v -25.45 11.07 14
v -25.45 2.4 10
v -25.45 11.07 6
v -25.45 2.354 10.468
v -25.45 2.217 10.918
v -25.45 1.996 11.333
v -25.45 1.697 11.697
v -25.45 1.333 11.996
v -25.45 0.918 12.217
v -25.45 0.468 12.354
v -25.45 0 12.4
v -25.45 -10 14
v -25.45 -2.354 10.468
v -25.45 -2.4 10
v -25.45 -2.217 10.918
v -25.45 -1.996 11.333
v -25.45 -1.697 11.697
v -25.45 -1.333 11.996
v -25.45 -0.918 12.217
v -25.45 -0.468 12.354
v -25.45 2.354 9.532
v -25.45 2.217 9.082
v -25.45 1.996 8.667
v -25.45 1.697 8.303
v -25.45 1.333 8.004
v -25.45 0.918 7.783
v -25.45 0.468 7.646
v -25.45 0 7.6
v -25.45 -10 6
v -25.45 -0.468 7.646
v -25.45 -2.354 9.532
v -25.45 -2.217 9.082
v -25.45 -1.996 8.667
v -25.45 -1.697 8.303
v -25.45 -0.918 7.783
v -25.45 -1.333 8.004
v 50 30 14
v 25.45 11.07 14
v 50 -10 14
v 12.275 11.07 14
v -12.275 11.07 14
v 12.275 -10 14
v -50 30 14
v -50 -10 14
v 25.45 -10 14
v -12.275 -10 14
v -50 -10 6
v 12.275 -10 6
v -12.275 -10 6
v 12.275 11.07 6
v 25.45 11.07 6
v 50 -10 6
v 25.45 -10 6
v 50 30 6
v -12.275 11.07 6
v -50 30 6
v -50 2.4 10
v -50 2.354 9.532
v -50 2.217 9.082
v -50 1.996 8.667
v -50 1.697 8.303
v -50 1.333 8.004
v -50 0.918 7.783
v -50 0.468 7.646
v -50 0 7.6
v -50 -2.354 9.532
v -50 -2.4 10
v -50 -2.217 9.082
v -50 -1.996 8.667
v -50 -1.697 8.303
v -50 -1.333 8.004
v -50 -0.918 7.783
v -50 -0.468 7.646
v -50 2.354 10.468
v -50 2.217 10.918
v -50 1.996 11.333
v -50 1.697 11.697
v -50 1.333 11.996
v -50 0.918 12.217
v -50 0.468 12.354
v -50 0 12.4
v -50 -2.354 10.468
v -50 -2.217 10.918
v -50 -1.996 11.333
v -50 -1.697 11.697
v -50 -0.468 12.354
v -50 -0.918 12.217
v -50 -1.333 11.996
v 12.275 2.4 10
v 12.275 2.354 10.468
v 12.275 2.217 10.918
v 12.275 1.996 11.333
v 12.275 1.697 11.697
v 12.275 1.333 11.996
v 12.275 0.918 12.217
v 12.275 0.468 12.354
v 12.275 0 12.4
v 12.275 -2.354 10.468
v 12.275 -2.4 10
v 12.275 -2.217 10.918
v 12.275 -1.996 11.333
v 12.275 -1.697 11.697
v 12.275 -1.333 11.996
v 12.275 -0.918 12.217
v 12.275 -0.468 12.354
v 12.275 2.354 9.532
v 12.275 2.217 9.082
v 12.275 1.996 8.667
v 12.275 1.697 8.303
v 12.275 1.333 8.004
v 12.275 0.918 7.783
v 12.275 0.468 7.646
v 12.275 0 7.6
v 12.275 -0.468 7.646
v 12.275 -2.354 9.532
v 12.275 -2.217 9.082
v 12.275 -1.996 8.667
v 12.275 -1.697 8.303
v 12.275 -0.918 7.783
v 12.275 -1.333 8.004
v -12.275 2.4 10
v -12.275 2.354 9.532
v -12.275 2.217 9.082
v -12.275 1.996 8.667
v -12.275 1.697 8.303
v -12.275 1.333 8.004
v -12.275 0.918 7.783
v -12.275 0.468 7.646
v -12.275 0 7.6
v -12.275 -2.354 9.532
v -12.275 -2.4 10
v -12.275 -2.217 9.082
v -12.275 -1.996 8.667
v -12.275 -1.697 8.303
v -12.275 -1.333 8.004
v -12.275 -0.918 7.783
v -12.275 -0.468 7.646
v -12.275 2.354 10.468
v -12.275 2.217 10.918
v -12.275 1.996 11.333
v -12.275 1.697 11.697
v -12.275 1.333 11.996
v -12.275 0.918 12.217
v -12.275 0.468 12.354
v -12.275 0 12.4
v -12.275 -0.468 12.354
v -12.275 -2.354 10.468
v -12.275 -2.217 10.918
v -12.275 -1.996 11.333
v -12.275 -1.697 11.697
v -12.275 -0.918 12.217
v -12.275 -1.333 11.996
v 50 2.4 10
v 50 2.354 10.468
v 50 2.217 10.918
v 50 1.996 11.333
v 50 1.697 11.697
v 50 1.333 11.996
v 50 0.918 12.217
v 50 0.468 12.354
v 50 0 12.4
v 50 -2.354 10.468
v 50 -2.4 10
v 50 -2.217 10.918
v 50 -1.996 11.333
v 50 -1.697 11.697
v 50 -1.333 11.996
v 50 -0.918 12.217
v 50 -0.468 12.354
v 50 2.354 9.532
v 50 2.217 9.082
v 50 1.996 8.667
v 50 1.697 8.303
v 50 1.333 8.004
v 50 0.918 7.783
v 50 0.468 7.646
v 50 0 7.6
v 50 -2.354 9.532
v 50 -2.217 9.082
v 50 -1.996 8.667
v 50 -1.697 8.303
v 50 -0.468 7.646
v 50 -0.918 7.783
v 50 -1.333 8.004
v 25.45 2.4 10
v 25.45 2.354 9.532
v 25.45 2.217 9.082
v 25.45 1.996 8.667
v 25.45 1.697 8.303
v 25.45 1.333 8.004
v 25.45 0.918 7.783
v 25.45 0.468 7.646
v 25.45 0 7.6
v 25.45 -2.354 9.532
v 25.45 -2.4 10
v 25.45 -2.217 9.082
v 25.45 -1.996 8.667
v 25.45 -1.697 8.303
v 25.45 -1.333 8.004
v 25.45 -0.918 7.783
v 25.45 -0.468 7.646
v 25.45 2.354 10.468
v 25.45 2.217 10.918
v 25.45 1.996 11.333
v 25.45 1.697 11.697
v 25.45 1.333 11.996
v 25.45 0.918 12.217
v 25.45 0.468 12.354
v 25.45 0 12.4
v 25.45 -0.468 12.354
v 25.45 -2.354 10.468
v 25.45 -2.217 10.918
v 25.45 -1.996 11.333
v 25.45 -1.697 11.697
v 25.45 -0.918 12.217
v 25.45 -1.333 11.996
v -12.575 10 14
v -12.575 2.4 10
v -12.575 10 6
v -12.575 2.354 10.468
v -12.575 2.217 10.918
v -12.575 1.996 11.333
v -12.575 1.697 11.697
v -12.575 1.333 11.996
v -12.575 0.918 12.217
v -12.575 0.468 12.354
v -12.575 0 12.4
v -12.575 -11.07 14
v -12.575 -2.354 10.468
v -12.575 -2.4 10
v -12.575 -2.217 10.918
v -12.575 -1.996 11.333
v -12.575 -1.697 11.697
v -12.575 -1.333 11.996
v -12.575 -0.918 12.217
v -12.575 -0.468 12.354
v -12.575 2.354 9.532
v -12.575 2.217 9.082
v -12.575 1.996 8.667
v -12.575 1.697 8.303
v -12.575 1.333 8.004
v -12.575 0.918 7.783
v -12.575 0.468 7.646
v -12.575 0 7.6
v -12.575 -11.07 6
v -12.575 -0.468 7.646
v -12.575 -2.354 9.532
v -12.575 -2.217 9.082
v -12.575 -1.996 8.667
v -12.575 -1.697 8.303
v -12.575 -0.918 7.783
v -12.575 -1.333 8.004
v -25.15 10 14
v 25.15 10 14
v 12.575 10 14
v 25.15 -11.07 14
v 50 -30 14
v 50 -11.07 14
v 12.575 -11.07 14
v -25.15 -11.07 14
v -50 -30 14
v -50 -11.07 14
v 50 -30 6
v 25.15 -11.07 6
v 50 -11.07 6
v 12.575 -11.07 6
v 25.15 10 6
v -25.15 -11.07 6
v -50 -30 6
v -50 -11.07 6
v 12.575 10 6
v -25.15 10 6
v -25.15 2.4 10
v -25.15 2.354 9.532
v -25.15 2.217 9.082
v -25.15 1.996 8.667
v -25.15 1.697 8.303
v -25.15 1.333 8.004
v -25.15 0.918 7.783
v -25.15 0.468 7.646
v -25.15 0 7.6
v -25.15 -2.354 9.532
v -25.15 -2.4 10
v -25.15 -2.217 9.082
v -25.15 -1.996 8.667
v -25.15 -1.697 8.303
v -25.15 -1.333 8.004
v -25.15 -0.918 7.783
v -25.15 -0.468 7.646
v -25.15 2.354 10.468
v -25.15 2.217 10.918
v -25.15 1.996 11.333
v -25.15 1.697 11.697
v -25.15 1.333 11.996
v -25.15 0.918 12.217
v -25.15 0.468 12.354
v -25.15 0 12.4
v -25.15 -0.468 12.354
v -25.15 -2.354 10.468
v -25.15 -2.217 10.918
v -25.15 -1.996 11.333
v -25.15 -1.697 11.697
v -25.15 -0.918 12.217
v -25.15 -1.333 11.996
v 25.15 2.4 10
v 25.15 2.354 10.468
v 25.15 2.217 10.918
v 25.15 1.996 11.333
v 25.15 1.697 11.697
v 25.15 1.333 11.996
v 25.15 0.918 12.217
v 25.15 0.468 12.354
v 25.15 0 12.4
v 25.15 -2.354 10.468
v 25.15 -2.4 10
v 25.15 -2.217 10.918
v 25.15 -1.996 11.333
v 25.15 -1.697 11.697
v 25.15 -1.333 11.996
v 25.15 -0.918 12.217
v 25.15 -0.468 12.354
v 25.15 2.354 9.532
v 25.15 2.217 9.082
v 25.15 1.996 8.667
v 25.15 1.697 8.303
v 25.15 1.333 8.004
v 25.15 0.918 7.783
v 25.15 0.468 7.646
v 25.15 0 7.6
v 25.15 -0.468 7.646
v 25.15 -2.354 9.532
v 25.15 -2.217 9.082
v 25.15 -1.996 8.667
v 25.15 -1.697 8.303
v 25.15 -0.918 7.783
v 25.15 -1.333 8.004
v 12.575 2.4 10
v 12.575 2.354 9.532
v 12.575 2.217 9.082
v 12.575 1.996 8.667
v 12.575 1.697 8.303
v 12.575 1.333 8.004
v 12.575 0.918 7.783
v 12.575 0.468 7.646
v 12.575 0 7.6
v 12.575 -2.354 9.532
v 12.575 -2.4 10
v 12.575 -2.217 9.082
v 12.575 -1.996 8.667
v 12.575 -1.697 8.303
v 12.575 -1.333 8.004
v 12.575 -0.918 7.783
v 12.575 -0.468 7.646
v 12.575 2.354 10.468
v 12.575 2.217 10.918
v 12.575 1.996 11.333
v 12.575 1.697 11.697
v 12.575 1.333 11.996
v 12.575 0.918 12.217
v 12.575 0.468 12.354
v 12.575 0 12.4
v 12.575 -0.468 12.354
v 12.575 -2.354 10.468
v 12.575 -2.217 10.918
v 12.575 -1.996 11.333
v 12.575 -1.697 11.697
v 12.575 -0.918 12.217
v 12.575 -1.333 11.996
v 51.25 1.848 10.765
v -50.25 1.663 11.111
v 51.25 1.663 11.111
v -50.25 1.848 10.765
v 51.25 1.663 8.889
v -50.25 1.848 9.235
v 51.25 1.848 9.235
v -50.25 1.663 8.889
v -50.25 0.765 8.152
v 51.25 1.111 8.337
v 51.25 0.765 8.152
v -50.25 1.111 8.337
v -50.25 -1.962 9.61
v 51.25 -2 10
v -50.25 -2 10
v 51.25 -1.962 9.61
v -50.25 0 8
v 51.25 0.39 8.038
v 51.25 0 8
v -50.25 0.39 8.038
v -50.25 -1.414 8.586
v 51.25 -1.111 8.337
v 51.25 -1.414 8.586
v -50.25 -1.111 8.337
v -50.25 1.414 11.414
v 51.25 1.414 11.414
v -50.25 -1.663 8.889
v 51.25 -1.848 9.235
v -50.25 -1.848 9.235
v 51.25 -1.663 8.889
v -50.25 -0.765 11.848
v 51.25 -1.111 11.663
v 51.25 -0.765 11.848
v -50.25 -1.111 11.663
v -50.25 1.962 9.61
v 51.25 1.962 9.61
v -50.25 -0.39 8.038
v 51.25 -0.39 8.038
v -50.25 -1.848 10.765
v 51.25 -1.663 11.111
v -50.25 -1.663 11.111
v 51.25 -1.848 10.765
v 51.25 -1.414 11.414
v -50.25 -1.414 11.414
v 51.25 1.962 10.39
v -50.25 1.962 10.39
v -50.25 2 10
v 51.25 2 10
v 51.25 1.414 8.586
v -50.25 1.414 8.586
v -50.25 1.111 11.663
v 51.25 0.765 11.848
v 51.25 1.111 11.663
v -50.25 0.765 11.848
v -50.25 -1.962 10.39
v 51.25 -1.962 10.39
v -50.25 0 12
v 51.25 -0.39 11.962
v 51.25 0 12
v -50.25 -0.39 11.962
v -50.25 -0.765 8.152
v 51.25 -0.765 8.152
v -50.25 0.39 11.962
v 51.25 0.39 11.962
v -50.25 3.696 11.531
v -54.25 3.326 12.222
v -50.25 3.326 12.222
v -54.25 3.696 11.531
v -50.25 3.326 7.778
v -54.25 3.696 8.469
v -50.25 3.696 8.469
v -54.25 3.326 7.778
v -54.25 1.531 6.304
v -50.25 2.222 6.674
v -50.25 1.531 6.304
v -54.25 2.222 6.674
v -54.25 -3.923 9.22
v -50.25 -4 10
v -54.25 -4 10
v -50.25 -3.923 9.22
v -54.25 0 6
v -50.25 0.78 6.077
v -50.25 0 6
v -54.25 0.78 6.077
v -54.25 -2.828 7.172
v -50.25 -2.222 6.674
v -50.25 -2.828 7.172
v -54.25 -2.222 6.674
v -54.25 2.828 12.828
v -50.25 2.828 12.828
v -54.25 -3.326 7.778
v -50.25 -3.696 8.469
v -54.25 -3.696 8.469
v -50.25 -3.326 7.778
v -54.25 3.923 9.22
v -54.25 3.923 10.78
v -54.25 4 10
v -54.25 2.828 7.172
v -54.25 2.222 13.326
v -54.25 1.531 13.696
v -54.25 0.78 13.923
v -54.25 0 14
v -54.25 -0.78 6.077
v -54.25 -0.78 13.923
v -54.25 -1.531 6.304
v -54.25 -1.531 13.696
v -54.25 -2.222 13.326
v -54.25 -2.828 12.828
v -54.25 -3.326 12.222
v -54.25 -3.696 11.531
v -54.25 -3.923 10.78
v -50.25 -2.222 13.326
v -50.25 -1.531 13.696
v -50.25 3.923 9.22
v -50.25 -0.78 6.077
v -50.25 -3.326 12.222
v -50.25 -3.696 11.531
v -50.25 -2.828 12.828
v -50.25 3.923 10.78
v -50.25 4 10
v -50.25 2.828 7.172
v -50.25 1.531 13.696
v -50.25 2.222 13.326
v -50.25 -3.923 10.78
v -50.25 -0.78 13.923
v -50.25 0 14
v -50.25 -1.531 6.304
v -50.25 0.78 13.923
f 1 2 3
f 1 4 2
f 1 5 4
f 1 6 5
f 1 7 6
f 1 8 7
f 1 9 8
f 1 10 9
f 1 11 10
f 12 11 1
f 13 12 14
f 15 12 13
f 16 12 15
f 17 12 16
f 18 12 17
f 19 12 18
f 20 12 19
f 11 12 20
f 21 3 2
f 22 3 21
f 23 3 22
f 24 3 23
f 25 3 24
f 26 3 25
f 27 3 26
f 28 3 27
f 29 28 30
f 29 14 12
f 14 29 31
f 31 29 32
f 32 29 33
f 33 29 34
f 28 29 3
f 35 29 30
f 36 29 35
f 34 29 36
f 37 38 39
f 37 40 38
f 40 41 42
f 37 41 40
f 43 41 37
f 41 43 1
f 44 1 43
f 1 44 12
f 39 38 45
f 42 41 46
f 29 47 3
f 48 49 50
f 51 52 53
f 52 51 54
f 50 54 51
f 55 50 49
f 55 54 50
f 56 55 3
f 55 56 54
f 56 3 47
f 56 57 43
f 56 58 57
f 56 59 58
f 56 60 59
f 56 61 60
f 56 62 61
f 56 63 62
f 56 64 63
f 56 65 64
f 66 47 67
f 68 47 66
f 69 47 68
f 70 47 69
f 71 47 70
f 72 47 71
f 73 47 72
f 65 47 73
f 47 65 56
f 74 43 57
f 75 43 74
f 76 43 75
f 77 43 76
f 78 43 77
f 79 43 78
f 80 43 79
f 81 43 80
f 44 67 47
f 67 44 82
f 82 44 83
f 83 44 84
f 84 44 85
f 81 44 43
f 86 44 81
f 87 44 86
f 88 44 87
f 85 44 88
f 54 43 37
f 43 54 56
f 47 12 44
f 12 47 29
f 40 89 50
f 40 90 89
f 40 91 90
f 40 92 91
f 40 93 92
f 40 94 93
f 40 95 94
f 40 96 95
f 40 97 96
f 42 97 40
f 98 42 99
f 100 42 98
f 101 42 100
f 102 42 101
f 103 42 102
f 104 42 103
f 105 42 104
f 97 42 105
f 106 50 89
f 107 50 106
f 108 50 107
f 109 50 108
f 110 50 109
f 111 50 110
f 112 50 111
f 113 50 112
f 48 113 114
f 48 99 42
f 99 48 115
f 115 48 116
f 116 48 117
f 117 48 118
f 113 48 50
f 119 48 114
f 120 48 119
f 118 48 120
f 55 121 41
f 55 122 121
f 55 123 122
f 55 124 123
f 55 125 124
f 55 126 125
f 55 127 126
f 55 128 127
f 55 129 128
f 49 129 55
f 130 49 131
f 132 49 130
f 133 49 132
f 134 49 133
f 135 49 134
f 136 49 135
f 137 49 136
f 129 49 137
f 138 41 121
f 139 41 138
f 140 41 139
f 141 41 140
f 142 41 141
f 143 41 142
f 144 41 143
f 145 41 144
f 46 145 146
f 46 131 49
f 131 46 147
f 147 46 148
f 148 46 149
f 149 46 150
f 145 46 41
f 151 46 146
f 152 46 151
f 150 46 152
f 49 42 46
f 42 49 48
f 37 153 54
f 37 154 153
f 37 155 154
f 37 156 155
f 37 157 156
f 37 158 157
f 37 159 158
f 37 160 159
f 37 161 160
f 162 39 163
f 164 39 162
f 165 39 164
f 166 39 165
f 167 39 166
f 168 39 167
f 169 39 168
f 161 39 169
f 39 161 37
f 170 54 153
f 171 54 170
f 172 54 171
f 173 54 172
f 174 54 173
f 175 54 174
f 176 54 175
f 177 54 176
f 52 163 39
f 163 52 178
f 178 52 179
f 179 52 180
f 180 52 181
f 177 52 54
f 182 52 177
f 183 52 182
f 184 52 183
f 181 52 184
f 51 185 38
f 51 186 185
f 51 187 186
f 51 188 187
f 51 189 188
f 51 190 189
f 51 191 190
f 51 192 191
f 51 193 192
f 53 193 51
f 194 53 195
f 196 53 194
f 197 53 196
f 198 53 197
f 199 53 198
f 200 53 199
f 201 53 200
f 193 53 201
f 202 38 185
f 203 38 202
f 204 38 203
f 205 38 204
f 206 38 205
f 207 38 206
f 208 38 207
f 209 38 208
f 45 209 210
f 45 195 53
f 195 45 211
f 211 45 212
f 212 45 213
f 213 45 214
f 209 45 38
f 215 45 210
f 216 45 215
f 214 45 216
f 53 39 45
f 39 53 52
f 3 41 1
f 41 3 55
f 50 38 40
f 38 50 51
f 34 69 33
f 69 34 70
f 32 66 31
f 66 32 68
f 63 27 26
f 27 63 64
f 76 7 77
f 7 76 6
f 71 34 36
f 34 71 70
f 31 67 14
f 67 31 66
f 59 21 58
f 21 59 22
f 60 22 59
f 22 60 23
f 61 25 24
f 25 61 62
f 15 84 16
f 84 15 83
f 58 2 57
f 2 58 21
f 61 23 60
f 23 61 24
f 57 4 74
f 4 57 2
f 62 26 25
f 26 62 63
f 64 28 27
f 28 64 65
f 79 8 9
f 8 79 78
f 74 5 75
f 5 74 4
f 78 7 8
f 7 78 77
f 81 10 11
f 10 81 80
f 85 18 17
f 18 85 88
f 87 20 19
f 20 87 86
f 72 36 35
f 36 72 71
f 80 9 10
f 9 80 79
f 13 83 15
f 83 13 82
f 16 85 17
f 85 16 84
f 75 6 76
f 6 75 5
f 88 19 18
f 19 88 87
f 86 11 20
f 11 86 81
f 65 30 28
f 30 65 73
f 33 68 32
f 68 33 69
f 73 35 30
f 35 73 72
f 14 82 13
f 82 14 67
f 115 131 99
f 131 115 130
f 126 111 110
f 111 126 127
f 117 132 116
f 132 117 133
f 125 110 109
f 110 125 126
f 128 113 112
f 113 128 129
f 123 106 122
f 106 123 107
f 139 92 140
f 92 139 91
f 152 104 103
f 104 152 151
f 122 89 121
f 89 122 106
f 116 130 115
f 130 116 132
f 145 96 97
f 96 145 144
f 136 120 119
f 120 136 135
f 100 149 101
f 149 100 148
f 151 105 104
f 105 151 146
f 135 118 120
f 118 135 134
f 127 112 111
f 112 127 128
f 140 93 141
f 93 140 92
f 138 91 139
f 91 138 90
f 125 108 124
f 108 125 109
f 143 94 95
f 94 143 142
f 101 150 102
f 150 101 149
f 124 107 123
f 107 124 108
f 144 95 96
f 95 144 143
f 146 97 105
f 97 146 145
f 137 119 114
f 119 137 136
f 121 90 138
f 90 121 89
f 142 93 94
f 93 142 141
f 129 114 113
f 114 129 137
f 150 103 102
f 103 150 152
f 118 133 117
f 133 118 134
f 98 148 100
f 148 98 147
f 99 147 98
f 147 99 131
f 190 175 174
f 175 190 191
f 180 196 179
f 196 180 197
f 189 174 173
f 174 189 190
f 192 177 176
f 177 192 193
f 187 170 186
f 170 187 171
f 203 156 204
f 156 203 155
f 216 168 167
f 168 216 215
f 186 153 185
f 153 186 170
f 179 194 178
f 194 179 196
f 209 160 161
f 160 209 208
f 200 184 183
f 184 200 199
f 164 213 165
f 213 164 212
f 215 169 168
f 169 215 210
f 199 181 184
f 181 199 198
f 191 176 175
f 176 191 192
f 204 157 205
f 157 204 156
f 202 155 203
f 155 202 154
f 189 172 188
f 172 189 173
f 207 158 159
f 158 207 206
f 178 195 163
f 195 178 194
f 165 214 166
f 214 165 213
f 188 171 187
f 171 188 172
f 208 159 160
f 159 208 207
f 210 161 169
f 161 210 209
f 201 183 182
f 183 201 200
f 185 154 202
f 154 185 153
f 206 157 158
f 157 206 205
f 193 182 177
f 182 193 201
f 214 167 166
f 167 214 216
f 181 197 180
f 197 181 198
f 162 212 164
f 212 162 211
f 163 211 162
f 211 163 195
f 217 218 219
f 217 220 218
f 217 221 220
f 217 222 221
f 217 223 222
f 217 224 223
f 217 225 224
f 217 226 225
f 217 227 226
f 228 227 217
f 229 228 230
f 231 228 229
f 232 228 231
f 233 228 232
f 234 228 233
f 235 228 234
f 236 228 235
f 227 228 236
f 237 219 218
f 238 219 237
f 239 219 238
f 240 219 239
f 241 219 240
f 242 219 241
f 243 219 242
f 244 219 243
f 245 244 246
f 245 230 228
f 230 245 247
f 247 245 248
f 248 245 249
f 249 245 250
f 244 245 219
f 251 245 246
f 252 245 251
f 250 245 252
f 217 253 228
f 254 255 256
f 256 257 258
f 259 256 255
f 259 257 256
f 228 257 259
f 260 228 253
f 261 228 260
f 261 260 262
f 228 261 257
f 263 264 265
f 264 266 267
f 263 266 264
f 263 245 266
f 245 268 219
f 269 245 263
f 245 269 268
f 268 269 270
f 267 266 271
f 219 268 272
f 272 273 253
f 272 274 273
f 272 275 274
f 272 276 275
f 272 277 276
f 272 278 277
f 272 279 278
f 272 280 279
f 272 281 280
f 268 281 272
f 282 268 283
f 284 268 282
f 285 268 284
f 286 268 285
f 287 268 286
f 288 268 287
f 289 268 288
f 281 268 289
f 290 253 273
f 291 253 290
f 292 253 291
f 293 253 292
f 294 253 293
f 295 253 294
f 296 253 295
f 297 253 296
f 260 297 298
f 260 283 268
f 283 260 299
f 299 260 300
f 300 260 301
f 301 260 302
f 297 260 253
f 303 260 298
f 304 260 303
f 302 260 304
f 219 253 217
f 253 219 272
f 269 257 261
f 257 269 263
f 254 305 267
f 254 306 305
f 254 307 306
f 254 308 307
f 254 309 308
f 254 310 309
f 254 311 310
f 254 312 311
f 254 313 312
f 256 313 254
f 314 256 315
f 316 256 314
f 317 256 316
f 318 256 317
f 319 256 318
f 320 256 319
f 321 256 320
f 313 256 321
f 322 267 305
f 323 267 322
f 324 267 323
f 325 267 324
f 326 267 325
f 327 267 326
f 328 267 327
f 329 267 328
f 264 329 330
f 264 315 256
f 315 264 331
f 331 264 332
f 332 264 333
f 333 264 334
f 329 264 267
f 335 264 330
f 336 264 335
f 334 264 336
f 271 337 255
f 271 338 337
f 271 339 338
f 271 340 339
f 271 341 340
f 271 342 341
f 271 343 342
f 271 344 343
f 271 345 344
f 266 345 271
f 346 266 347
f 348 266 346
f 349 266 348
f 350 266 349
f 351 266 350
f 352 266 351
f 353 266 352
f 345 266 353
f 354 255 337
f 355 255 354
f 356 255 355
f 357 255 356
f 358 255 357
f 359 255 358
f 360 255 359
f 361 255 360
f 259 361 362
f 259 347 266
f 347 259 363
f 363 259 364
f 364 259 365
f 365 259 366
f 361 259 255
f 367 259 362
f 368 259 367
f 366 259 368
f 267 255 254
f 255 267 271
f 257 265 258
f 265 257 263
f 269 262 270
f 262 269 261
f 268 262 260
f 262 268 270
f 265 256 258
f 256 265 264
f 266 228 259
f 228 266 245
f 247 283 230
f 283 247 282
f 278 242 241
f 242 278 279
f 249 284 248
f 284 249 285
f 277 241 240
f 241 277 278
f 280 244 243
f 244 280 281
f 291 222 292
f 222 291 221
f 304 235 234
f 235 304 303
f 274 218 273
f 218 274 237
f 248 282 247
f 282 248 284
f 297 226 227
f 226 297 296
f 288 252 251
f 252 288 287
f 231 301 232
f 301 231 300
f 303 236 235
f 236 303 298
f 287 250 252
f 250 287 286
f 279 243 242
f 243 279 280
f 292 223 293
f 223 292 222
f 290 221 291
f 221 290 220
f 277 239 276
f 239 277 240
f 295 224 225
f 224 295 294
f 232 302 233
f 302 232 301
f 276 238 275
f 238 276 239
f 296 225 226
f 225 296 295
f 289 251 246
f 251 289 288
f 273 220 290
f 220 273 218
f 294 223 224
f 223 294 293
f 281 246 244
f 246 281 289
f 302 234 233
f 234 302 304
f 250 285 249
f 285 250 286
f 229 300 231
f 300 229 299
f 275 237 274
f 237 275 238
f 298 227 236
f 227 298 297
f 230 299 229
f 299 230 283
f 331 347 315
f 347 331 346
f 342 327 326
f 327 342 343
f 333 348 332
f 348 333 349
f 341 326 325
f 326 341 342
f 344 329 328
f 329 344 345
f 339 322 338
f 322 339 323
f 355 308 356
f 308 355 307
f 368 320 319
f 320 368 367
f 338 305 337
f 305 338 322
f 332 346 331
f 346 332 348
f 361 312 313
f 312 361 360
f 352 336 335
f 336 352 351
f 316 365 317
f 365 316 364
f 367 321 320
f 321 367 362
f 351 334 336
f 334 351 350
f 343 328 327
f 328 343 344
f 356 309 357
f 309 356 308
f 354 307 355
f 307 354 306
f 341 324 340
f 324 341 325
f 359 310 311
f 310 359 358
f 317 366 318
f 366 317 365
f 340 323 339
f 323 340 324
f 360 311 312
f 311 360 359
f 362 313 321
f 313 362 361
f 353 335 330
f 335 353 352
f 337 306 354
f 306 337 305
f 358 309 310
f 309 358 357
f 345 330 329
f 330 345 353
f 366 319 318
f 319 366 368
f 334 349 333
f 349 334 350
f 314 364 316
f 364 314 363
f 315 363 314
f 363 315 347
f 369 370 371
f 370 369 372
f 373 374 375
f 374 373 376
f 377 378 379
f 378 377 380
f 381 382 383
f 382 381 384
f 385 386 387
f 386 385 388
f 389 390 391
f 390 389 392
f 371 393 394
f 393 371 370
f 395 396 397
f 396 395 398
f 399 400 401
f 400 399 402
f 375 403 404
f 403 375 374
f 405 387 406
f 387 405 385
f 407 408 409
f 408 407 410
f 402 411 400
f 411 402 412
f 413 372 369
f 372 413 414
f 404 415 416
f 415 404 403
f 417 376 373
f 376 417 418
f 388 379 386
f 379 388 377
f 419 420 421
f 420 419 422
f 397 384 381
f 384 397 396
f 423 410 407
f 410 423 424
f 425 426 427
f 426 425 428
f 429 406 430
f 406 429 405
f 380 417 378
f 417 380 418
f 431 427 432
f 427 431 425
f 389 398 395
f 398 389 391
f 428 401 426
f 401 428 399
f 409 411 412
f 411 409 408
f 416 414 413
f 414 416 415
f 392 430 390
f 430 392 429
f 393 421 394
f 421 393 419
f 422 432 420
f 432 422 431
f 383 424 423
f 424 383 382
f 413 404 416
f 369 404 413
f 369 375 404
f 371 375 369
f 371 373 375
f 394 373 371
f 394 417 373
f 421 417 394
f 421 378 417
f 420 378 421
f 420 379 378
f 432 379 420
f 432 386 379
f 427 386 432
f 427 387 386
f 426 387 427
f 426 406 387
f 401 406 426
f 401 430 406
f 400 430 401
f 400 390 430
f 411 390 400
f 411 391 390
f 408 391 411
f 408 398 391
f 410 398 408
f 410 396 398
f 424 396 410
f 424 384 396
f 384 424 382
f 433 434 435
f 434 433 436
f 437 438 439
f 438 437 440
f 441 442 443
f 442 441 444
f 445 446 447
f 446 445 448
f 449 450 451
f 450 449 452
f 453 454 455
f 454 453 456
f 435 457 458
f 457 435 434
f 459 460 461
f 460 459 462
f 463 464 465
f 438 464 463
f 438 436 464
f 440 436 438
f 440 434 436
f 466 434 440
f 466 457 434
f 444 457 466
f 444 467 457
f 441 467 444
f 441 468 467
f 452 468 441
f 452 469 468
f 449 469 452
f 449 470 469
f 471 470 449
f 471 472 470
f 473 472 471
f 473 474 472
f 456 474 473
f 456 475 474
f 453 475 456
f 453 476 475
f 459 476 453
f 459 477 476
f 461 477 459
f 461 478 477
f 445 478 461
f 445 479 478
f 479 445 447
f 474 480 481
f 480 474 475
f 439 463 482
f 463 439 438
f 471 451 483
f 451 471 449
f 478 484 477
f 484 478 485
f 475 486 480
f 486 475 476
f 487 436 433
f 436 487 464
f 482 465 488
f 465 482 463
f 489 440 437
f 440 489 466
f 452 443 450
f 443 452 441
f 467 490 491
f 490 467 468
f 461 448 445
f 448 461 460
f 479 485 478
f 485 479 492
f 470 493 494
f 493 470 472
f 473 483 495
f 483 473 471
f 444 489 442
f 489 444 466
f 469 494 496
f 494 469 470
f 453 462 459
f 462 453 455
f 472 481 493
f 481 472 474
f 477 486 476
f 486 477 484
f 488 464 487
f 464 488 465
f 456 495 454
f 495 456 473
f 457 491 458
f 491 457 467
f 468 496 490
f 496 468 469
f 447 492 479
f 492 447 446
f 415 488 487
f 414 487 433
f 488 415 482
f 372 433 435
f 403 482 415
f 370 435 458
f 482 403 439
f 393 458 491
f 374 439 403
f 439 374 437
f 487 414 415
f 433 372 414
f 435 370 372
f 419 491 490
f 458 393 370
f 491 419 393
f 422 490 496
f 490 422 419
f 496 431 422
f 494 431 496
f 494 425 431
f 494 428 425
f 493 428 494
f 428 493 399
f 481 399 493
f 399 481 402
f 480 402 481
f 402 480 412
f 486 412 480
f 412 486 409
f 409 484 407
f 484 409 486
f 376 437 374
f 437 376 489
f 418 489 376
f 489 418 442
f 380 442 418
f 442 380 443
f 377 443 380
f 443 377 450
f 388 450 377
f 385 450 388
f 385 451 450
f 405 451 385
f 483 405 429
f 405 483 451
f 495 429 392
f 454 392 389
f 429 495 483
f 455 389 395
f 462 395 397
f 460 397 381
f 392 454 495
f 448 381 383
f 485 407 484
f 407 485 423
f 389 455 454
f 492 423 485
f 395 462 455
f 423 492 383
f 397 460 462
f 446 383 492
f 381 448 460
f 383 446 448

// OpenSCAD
$fn = 32;

// ------------------------------------------------------------------------
// Butt hinge: hinge 100 mm, leaf swung 0 deg
// Every part is its own module, assembly() places every instance.
// ------------------------------------------------------------------------

// --- part 1 ---
module hinge_base() {
  difference() {
    union() {
      translate([-50, -10, -4]) cube([24.55, 40, 8]);
      translate([-12.275, -10, -4]) cube([24.55, 40, 8]);
      translate([25.45, -10, -4]) cube([24.55, 40, 8]);
      translate([-50, 11.07, -4]) cube([100, 18.93, 8]);
    }
    translate([-37.725, 0, 0]) rotate([0, 90, 0]) cylinder(h = 26.55, d = 4.8, center = true);
    translate([0, 0, 0]) rotate([0, 90, 0]) cylinder(h = 26.55, d = 4.8, center = true);
    translate([37.725, 0, 0]) rotate([0, 90, 0]) cylinder(h = 26.55, d = 4.8, center = true);
  }
}

// --- part 2 ---
module hinge_mover() {
  difference() {
    union() {
      translate([-25.15, -30, -4]) cube([12.575, 40, 8]);
      translate([12.575, -30, -4]) cube([12.575, 40, 8]);
      translate([-50, -30, -4]) cube([100, 18.93, 8]);
    }
    translate([-18.863, 0, 0]) rotate([0, 90, 0]) cylinder(h = 14.575, d = 4.8, center = true);
    translate([18.863, 0, 0]) rotate([0, 90, 0]) cylinder(h = 14.575, d = 4.8, center = true);
  }
}

// --- part 3 ---
module hinge_pin() {
  rotate([0, 90, 0]) cylinder(h = 102.5, d = 4, center = true);
  translate([-54.25, 0, 0]) rotate([0, 90, 0]) cylinder(h = 4, d = 8);
}

// --- assembly ---
module assembly() {
  color([0.80, 0.24, 0.20]) translate([0, 0, 10]) rotate([0, 0, 0]) hinge_base();
  color([0.20, 0.45, 0.75]) translate([0, 0, 10]) rotate([0, 0, 0]) hinge_mover();
  color([0.25, 0.62, 0.32]) translate([0, 0, 10]) rotate([0, 0, 0]) hinge_pin();
}

assembly();
